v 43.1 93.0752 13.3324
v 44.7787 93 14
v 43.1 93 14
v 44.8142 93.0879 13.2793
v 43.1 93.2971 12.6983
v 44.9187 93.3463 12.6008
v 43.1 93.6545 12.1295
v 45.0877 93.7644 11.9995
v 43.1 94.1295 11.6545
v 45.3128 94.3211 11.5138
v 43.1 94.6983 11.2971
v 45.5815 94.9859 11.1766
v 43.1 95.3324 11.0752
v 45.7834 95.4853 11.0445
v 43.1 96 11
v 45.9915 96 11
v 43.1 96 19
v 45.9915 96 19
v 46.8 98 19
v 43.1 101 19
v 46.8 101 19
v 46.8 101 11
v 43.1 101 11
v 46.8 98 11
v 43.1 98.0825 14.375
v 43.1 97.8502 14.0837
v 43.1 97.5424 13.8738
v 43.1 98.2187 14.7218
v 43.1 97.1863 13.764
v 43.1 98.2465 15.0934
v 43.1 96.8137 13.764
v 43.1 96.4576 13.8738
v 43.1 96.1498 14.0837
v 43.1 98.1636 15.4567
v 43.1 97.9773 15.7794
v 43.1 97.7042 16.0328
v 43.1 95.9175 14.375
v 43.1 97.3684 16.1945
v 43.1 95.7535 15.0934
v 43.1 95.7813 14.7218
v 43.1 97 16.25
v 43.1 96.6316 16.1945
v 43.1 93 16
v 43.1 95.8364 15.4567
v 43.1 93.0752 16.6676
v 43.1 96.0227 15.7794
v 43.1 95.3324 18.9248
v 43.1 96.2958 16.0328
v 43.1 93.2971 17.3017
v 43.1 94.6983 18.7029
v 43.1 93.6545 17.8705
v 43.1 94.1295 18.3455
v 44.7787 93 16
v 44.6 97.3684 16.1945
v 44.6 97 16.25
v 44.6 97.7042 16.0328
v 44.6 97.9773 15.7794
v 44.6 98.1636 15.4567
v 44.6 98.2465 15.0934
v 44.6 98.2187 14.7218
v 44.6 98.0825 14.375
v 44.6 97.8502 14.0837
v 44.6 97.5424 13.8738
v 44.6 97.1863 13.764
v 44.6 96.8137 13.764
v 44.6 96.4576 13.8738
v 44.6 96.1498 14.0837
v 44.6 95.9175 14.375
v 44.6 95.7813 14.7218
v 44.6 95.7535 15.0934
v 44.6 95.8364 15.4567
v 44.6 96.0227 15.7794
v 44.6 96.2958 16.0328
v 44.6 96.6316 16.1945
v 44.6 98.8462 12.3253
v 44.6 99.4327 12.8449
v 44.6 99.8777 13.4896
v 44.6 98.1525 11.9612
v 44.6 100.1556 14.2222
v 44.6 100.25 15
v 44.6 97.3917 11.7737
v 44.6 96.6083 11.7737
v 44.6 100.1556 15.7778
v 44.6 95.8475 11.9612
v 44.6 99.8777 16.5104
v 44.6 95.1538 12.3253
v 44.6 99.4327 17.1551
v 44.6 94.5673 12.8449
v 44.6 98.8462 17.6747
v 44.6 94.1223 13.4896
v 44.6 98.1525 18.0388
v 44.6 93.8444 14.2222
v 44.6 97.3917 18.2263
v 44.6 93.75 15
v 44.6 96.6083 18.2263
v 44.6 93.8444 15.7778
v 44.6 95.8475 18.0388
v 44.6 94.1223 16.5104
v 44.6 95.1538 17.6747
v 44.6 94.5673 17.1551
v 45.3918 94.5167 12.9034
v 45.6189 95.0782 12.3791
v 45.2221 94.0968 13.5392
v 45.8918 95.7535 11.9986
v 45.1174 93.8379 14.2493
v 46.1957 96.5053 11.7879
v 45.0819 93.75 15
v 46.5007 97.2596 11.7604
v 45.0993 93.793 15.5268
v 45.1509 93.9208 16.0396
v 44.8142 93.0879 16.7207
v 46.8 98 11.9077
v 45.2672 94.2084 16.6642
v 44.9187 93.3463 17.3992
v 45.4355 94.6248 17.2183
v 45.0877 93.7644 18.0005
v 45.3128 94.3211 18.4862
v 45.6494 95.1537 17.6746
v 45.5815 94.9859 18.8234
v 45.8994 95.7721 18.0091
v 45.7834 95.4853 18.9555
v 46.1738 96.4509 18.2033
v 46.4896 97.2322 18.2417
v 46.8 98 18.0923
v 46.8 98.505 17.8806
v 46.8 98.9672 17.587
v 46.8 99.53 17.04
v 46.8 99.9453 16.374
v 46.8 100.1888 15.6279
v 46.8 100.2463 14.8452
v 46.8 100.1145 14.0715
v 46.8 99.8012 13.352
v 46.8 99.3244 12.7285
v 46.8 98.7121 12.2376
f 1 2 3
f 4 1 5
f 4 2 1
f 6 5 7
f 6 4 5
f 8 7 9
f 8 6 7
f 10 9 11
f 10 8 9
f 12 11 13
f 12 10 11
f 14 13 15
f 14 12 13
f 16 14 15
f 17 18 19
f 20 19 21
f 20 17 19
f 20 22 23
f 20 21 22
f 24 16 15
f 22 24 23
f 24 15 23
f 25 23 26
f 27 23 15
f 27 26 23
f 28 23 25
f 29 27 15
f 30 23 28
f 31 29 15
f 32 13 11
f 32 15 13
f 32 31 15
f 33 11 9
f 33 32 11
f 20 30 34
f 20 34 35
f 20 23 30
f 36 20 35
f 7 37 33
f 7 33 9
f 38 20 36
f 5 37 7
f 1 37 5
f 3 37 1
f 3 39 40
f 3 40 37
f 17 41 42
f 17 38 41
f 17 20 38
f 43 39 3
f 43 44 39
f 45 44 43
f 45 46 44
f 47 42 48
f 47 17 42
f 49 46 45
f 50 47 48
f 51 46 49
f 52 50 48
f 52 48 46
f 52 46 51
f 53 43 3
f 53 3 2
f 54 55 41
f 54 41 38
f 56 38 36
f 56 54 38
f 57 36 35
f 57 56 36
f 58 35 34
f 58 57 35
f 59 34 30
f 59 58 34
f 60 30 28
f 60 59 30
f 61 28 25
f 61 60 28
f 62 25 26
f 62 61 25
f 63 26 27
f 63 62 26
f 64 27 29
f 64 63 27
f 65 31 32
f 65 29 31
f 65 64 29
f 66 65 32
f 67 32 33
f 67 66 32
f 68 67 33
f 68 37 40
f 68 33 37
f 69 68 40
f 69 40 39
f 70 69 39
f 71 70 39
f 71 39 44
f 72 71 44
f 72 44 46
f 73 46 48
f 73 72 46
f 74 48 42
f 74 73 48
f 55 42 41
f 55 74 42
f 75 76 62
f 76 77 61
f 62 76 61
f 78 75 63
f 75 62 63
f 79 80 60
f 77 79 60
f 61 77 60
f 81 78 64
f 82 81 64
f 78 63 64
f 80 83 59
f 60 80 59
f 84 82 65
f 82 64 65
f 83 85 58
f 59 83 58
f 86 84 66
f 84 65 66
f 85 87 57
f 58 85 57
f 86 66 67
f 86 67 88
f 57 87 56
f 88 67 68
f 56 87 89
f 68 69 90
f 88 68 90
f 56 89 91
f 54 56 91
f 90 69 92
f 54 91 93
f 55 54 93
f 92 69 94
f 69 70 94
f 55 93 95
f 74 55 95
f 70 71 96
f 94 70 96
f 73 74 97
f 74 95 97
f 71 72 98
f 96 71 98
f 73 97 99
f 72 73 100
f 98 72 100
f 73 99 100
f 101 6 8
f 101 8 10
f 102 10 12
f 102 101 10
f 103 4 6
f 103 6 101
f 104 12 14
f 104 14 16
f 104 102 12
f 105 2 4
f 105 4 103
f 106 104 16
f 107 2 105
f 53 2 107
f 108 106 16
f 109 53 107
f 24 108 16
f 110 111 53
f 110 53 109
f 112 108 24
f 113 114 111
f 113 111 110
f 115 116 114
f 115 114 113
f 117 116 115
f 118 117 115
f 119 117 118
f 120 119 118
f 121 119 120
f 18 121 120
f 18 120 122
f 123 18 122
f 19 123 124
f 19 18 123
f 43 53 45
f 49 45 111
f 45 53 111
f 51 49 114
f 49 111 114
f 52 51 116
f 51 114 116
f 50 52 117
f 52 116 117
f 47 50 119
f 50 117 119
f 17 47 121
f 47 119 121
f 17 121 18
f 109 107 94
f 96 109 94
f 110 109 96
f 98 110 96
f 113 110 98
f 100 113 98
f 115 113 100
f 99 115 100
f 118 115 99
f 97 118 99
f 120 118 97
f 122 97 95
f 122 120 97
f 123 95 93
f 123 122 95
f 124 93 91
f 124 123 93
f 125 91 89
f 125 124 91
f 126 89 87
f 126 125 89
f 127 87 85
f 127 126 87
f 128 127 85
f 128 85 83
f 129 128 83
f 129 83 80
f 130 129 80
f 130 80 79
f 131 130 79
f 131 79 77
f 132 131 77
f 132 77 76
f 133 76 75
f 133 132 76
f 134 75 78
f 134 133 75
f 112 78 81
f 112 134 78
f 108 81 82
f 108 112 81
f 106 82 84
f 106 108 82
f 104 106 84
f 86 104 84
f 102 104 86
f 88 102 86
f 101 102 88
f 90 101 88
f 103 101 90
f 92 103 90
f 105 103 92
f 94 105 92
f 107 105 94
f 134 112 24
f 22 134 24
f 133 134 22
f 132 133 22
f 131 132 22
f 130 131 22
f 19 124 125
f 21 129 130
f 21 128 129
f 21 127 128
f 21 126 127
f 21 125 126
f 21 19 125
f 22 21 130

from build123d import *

# Parameters (mm, degrees)
PAD026_DEPTH            = 4
SKETCH054_R             = 3.25
POCKET017_DEPTH         = 3.5
SKETCH056_R             = 1.25
POCKET018_DEPTH         = 5
FILLET001_R             = 3
BODY040_PLACEMENT_ANGLE = 90


with BuildPart() as part:
    # Sketch052 → Pad026 (new body, symmetric)
    with BuildSketch(Plane.YZ.offset(-96)):
        Polygon((93, 26.9), (93.000001, 25.221294), (97.999998, 23.199999), (101.000002, 23.2), (101, 26.9), align=None)
    extrude(amount=PAD026_DEPTH, both=True)

    # Sketch054 (on Face5 of Pad026) → Pocket017 (cut)
    with BuildSketch(Plane(origin=(0, 0, 21.9), x_dir=(0, -1, 0), z_dir=(0, 0, 1))):
        with Locations((-97, -96)):
            Circle(SKETCH054_R)
    extrude(amount=POCKET017_DEPTH, mode=Mode.SUBTRACT)

    # Sketch056 → Pocket018 (cut)
    with BuildSketch(Plane.XY.offset(22)):
        with Locations((-96, 97)):
            Circle(SKETCH056_R)
    extrude(amount=POCKET018_DEPTH, mode=Mode.SUBTRACT)

    # Fillet001
    fillet001_edges = [part.edges().sort_by_distance(p)[0] for p in [
        (-92, 93.000001, 26.060647),
        (-100, 93.000001, 26.060647),
    ]]
    fillet(fillet001_edges, radius=FILLET001_R)


with BuildPart() as part_1:
    # Body040 placement: moved
    add(part.part.moved(Location((-122, 0, 111))).rotate(Axis((-122, 0, 111), (0, -1, 0)), BODY040_PLACEMENT_ANGLE))


with BuildPart() as part_2:
    # Body046 placement: moved
    add(part_1.part.moved(Location((192, 0, 0))))


solid = part_2.part
